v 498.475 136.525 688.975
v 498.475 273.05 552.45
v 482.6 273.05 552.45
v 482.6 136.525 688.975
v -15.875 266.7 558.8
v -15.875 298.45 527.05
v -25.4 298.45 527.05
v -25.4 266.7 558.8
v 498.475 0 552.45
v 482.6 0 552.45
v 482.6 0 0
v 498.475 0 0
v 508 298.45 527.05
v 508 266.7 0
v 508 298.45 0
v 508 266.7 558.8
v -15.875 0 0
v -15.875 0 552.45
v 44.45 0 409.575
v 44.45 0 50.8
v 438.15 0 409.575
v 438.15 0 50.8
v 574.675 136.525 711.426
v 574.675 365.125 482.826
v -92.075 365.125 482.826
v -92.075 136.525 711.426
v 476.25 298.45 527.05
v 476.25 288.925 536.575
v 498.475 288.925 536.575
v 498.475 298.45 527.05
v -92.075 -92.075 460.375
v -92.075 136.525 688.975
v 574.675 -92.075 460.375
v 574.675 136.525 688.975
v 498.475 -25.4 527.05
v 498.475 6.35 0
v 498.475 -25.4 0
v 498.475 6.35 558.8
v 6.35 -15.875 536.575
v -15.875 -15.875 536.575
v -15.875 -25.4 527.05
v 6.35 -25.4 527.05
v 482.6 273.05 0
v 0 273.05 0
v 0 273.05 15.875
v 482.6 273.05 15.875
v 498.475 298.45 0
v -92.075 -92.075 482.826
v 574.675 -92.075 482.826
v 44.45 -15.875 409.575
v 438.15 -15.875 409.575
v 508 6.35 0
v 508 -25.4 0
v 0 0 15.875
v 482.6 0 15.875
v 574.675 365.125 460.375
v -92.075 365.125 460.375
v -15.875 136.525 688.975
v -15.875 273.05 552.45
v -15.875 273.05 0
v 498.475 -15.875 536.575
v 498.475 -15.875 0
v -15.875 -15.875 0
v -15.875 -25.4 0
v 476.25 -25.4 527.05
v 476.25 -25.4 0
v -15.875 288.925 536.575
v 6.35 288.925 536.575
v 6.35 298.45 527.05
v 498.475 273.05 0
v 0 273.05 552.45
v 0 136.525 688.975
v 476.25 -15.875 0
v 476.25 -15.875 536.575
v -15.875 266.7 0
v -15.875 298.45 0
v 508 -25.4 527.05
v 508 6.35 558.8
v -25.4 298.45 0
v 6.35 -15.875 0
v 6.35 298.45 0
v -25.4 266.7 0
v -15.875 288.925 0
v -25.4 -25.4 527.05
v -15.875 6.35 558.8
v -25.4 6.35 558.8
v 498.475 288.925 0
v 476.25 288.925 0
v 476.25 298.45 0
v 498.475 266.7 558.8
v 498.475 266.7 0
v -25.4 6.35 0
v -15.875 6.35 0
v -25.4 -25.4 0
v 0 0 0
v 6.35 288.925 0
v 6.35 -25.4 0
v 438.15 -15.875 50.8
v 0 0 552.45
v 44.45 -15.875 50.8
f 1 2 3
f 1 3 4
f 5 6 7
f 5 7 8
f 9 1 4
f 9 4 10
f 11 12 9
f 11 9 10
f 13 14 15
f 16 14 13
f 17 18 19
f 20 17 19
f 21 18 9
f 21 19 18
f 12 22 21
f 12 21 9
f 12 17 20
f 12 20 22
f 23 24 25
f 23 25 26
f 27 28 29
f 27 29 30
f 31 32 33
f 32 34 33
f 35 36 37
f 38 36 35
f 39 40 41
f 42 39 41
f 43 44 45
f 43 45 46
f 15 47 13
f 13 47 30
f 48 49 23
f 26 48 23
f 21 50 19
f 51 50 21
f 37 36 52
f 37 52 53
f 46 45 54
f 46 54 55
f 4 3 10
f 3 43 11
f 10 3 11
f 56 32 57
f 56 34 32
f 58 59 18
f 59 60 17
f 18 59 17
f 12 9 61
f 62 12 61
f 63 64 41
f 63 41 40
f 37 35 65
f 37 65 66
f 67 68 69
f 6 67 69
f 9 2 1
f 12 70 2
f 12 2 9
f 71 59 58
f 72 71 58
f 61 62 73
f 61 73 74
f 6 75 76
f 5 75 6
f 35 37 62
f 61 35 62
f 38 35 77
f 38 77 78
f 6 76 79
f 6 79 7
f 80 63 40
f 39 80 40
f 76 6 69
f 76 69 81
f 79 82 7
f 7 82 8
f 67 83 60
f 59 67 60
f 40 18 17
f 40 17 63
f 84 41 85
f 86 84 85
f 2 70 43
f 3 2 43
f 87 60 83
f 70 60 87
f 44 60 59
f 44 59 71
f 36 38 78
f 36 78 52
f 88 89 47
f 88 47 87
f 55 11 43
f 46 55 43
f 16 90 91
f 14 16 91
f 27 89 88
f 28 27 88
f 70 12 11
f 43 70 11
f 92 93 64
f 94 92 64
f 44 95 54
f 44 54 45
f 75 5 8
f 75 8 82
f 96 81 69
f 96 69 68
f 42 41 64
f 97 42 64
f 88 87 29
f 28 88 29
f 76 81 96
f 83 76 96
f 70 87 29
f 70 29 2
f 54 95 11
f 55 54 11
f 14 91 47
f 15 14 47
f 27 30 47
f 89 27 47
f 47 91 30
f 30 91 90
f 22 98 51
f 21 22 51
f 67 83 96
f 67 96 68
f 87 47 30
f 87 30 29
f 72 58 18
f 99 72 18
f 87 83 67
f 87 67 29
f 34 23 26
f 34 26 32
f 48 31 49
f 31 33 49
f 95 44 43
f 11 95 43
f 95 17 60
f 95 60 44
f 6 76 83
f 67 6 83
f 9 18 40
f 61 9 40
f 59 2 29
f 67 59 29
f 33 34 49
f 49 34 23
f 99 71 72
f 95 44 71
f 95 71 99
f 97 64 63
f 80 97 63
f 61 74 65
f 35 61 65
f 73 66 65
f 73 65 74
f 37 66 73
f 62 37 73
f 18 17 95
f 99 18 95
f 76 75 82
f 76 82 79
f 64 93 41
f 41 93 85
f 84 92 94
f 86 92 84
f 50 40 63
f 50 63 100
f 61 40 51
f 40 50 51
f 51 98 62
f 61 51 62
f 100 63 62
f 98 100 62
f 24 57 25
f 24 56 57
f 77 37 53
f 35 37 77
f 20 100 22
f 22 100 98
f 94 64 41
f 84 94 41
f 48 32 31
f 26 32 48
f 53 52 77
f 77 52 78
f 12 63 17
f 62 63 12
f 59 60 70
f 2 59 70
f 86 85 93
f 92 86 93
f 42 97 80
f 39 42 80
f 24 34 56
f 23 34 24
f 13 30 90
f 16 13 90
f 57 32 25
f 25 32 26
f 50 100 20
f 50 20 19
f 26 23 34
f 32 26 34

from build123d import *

# Parameters (mm, degrees)
F4_W           = 482.6
F4_H           = 273.05
F5_DEPTH       = 15.875
F6_W           = 15.875
F6_H           = 273.05
F7_DEPTH       = 688.975
F9_DEPTH       = 15.875
F12_W          = 514.35
F12_H          = 15.875
F13_DEPTH      = 552.45
F15_DEPTH      = 514.35
F16_W          = 514.35
F16_H          = 15.875
F17_DEPTH      = 552.45
F19_DEPTH      = 514.35
F20_W          = 393.7
F20_H          = 358.775
F21_DEPTH      = 15.875
F23_DEPTH      = 590.55
F23_DEPTH_BACK = 76.2
F28_DEPTH      = 9.525
F30_DEPTH      = 22.225


# Not quite as in the source:
# - a length typed as a fraction of an inch, garbled in the dataset ("3 / 203.2 mm" for 3/8 in), is restored


with BuildPart() as f5:
    # F4 (on Top) → F5 (new body)
    with BuildSketch(Plane.XY):
        with Locations((241.3, 136.525)):
            Rectangle(F4_W, F4_H)
    extrude(amount=F5_DEPTH)


with BuildPart() as f7:
    # F6 (on face) → F7 (new body)
    with BuildSketch(Plane(origin=(0, 0, 0), x_dir=(1, 0, 0), z_dir=(0, 0, -1))):
        with Locations((-7.9375, -136.525)):
            Rectangle(F6_W, F6_H)
    extrude(amount=-F7_DEPTH)

    # F8 (on face) → F9 (cut, through all)
    with BuildSketch(Plane(origin=(-15.875, 0, 0), x_dir=(0, -1, 0), z_dir=(-1, 0, 0))):
        Polygon((-273.05, 552.45), (-136.525, 688.975), (-273.05, 688.975), align=None)
        Polygon((0, 688.975), (-136.525, 688.975), (0, 552.45), align=None)
    extrude(amount=-F9_DEPTH, mode=Mode.SUBTRACT)


with BuildPart() as f11_1:
    # F11: instance of F7
    add(f7.part.mirror(Plane.YZ.offset(241.3)))


with BuildPart() as f13:
    # F12 (on face) → F13 (new body)
    with BuildSketch(Plane(origin=(0, 0, 0), x_dir=(1, 0, 0), z_dir=(0, 0, -1))):
        with Locations((241.3, -280.9875)):
            Rectangle(F12_W, F12_H)
    extrude(amount=-F13_DEPTH)

    # F14 (on face) → F15 (cut, through all)
    with BuildSketch(Plane.YZ.offset(498.475)):
        Polygon((288.925, 552.45), (273.05, 552.45), (288.925, 536.575), align=None)
    extrude(amount=-F15_DEPTH, mode=Mode.SUBTRACT)


with BuildPart() as f17:
    # F16 (on face) → F17 (new body)
    with BuildSketch(Plane(origin=(0, 0, 0), x_dir=(1, 0, 0), z_dir=(0, 0, -1))):
        with Locations((241.3, 7.9375)):
            Rectangle(F16_W, F16_H)
    extrude(amount=-F17_DEPTH)

    # F18 (on face) → F19 (cut, through all)
    with BuildSketch(Plane(origin=(-15.875, 0, 0), x_dir=(0, -1, 0), z_dir=(-1, 0, 0))):
        Polygon((15.875, 552.45), (0, 552.45), (15.875, 536.575), align=None)
    extrude(amount=-F19_DEPTH, mode=Mode.SUBTRACT)

    # F20 (on face) → F21 (cut, through all)
    with BuildSketch(Plane.XZ.offset(15.875)):
        with Locations((241.3, 230.1875)):
            Rectangle(F20_W, F20_H)
    extrude(amount=-F21_DEPTH, mode=Mode.SUBTRACT)


with BuildPart() as f23:
    # F22 (on face) → F23 (new body, two sides)
    with BuildSketch(Plane(origin=(-15.875, 0, 0), x_dir=(0, -1, 0), z_dir=(-1, 0, 0))) as f23_sk:
        Polygon((-136.525, 711.4256403027), (-136.525, 688.975), (92.075, 460.375), (92.075, 482.8256403027), align=None)
    extrude(amount=-F23_DEPTH)
    extrude(f23_sk.sketch, amount=F23_DEPTH_BACK)


with BuildPart() as f25_1:
    # F25: instance of F23
    add(f23.part.mirror(Plane.XZ.offset(-136.525)))


with BuildPart() as f28:
    # F27 (on face) → F28 (new body)
    with BuildSketch(Plane(origin=(-15.875, 0, 0), x_dir=(0, -1, 0), z_dir=(-1, 0, 0))):
        Polygon((25.4, 527.05), (-6.35, 558.8), (-6.35, 0), (25.4, 0), align=None)
    extrude(amount=F28_DEPTH)


with BuildPart() as f30:
    # F29 (on face) → F30 (new body)
    with BuildSketch(Plane.YZ.offset(-15.875)):
        Polygon((-15.875, 536.575), (-25.4, 527.05), (-25.4, 0), (-15.875, 0), align=None)
    extrude(amount=F30_DEPTH)


with BuildPart() as f31_1:
    # F31: instance of F30
    add(f30.part.mirror(Plane.XZ.offset(-136.525)))


with BuildPart() as f31_2:
    # F31: instance of F28
    add(f28.part.mirror(Plane.XZ.offset(-136.525)))


with BuildPart() as f32_1:
    # F32: instance of F28
    add(f28.part.mirror(Plane.YZ.offset(241.3)))


with BuildPart() as f32_2:
    # F32: instance of F30
    add(f30.part.mirror(Plane.YZ.offset(241.3)))


with BuildPart() as f32_3:
    # F32: instance of F31_2
    add(f31_2.part.mirror(Plane.YZ.offset(241.3)))


with BuildPart() as f32_4:
    # F32: instance of F31_1
    add(f31_1.part.mirror(Plane.YZ.offset(241.3)))


solid = Compound([f5.part, f7.part, f11_1.part, f13.part, f17.part, f23.part, f25_1.part, f28.part, f30.part, f31_1.part, f31_2.part, f32_1.part, f32_2.part, f32_3.part, f32_4.part])
